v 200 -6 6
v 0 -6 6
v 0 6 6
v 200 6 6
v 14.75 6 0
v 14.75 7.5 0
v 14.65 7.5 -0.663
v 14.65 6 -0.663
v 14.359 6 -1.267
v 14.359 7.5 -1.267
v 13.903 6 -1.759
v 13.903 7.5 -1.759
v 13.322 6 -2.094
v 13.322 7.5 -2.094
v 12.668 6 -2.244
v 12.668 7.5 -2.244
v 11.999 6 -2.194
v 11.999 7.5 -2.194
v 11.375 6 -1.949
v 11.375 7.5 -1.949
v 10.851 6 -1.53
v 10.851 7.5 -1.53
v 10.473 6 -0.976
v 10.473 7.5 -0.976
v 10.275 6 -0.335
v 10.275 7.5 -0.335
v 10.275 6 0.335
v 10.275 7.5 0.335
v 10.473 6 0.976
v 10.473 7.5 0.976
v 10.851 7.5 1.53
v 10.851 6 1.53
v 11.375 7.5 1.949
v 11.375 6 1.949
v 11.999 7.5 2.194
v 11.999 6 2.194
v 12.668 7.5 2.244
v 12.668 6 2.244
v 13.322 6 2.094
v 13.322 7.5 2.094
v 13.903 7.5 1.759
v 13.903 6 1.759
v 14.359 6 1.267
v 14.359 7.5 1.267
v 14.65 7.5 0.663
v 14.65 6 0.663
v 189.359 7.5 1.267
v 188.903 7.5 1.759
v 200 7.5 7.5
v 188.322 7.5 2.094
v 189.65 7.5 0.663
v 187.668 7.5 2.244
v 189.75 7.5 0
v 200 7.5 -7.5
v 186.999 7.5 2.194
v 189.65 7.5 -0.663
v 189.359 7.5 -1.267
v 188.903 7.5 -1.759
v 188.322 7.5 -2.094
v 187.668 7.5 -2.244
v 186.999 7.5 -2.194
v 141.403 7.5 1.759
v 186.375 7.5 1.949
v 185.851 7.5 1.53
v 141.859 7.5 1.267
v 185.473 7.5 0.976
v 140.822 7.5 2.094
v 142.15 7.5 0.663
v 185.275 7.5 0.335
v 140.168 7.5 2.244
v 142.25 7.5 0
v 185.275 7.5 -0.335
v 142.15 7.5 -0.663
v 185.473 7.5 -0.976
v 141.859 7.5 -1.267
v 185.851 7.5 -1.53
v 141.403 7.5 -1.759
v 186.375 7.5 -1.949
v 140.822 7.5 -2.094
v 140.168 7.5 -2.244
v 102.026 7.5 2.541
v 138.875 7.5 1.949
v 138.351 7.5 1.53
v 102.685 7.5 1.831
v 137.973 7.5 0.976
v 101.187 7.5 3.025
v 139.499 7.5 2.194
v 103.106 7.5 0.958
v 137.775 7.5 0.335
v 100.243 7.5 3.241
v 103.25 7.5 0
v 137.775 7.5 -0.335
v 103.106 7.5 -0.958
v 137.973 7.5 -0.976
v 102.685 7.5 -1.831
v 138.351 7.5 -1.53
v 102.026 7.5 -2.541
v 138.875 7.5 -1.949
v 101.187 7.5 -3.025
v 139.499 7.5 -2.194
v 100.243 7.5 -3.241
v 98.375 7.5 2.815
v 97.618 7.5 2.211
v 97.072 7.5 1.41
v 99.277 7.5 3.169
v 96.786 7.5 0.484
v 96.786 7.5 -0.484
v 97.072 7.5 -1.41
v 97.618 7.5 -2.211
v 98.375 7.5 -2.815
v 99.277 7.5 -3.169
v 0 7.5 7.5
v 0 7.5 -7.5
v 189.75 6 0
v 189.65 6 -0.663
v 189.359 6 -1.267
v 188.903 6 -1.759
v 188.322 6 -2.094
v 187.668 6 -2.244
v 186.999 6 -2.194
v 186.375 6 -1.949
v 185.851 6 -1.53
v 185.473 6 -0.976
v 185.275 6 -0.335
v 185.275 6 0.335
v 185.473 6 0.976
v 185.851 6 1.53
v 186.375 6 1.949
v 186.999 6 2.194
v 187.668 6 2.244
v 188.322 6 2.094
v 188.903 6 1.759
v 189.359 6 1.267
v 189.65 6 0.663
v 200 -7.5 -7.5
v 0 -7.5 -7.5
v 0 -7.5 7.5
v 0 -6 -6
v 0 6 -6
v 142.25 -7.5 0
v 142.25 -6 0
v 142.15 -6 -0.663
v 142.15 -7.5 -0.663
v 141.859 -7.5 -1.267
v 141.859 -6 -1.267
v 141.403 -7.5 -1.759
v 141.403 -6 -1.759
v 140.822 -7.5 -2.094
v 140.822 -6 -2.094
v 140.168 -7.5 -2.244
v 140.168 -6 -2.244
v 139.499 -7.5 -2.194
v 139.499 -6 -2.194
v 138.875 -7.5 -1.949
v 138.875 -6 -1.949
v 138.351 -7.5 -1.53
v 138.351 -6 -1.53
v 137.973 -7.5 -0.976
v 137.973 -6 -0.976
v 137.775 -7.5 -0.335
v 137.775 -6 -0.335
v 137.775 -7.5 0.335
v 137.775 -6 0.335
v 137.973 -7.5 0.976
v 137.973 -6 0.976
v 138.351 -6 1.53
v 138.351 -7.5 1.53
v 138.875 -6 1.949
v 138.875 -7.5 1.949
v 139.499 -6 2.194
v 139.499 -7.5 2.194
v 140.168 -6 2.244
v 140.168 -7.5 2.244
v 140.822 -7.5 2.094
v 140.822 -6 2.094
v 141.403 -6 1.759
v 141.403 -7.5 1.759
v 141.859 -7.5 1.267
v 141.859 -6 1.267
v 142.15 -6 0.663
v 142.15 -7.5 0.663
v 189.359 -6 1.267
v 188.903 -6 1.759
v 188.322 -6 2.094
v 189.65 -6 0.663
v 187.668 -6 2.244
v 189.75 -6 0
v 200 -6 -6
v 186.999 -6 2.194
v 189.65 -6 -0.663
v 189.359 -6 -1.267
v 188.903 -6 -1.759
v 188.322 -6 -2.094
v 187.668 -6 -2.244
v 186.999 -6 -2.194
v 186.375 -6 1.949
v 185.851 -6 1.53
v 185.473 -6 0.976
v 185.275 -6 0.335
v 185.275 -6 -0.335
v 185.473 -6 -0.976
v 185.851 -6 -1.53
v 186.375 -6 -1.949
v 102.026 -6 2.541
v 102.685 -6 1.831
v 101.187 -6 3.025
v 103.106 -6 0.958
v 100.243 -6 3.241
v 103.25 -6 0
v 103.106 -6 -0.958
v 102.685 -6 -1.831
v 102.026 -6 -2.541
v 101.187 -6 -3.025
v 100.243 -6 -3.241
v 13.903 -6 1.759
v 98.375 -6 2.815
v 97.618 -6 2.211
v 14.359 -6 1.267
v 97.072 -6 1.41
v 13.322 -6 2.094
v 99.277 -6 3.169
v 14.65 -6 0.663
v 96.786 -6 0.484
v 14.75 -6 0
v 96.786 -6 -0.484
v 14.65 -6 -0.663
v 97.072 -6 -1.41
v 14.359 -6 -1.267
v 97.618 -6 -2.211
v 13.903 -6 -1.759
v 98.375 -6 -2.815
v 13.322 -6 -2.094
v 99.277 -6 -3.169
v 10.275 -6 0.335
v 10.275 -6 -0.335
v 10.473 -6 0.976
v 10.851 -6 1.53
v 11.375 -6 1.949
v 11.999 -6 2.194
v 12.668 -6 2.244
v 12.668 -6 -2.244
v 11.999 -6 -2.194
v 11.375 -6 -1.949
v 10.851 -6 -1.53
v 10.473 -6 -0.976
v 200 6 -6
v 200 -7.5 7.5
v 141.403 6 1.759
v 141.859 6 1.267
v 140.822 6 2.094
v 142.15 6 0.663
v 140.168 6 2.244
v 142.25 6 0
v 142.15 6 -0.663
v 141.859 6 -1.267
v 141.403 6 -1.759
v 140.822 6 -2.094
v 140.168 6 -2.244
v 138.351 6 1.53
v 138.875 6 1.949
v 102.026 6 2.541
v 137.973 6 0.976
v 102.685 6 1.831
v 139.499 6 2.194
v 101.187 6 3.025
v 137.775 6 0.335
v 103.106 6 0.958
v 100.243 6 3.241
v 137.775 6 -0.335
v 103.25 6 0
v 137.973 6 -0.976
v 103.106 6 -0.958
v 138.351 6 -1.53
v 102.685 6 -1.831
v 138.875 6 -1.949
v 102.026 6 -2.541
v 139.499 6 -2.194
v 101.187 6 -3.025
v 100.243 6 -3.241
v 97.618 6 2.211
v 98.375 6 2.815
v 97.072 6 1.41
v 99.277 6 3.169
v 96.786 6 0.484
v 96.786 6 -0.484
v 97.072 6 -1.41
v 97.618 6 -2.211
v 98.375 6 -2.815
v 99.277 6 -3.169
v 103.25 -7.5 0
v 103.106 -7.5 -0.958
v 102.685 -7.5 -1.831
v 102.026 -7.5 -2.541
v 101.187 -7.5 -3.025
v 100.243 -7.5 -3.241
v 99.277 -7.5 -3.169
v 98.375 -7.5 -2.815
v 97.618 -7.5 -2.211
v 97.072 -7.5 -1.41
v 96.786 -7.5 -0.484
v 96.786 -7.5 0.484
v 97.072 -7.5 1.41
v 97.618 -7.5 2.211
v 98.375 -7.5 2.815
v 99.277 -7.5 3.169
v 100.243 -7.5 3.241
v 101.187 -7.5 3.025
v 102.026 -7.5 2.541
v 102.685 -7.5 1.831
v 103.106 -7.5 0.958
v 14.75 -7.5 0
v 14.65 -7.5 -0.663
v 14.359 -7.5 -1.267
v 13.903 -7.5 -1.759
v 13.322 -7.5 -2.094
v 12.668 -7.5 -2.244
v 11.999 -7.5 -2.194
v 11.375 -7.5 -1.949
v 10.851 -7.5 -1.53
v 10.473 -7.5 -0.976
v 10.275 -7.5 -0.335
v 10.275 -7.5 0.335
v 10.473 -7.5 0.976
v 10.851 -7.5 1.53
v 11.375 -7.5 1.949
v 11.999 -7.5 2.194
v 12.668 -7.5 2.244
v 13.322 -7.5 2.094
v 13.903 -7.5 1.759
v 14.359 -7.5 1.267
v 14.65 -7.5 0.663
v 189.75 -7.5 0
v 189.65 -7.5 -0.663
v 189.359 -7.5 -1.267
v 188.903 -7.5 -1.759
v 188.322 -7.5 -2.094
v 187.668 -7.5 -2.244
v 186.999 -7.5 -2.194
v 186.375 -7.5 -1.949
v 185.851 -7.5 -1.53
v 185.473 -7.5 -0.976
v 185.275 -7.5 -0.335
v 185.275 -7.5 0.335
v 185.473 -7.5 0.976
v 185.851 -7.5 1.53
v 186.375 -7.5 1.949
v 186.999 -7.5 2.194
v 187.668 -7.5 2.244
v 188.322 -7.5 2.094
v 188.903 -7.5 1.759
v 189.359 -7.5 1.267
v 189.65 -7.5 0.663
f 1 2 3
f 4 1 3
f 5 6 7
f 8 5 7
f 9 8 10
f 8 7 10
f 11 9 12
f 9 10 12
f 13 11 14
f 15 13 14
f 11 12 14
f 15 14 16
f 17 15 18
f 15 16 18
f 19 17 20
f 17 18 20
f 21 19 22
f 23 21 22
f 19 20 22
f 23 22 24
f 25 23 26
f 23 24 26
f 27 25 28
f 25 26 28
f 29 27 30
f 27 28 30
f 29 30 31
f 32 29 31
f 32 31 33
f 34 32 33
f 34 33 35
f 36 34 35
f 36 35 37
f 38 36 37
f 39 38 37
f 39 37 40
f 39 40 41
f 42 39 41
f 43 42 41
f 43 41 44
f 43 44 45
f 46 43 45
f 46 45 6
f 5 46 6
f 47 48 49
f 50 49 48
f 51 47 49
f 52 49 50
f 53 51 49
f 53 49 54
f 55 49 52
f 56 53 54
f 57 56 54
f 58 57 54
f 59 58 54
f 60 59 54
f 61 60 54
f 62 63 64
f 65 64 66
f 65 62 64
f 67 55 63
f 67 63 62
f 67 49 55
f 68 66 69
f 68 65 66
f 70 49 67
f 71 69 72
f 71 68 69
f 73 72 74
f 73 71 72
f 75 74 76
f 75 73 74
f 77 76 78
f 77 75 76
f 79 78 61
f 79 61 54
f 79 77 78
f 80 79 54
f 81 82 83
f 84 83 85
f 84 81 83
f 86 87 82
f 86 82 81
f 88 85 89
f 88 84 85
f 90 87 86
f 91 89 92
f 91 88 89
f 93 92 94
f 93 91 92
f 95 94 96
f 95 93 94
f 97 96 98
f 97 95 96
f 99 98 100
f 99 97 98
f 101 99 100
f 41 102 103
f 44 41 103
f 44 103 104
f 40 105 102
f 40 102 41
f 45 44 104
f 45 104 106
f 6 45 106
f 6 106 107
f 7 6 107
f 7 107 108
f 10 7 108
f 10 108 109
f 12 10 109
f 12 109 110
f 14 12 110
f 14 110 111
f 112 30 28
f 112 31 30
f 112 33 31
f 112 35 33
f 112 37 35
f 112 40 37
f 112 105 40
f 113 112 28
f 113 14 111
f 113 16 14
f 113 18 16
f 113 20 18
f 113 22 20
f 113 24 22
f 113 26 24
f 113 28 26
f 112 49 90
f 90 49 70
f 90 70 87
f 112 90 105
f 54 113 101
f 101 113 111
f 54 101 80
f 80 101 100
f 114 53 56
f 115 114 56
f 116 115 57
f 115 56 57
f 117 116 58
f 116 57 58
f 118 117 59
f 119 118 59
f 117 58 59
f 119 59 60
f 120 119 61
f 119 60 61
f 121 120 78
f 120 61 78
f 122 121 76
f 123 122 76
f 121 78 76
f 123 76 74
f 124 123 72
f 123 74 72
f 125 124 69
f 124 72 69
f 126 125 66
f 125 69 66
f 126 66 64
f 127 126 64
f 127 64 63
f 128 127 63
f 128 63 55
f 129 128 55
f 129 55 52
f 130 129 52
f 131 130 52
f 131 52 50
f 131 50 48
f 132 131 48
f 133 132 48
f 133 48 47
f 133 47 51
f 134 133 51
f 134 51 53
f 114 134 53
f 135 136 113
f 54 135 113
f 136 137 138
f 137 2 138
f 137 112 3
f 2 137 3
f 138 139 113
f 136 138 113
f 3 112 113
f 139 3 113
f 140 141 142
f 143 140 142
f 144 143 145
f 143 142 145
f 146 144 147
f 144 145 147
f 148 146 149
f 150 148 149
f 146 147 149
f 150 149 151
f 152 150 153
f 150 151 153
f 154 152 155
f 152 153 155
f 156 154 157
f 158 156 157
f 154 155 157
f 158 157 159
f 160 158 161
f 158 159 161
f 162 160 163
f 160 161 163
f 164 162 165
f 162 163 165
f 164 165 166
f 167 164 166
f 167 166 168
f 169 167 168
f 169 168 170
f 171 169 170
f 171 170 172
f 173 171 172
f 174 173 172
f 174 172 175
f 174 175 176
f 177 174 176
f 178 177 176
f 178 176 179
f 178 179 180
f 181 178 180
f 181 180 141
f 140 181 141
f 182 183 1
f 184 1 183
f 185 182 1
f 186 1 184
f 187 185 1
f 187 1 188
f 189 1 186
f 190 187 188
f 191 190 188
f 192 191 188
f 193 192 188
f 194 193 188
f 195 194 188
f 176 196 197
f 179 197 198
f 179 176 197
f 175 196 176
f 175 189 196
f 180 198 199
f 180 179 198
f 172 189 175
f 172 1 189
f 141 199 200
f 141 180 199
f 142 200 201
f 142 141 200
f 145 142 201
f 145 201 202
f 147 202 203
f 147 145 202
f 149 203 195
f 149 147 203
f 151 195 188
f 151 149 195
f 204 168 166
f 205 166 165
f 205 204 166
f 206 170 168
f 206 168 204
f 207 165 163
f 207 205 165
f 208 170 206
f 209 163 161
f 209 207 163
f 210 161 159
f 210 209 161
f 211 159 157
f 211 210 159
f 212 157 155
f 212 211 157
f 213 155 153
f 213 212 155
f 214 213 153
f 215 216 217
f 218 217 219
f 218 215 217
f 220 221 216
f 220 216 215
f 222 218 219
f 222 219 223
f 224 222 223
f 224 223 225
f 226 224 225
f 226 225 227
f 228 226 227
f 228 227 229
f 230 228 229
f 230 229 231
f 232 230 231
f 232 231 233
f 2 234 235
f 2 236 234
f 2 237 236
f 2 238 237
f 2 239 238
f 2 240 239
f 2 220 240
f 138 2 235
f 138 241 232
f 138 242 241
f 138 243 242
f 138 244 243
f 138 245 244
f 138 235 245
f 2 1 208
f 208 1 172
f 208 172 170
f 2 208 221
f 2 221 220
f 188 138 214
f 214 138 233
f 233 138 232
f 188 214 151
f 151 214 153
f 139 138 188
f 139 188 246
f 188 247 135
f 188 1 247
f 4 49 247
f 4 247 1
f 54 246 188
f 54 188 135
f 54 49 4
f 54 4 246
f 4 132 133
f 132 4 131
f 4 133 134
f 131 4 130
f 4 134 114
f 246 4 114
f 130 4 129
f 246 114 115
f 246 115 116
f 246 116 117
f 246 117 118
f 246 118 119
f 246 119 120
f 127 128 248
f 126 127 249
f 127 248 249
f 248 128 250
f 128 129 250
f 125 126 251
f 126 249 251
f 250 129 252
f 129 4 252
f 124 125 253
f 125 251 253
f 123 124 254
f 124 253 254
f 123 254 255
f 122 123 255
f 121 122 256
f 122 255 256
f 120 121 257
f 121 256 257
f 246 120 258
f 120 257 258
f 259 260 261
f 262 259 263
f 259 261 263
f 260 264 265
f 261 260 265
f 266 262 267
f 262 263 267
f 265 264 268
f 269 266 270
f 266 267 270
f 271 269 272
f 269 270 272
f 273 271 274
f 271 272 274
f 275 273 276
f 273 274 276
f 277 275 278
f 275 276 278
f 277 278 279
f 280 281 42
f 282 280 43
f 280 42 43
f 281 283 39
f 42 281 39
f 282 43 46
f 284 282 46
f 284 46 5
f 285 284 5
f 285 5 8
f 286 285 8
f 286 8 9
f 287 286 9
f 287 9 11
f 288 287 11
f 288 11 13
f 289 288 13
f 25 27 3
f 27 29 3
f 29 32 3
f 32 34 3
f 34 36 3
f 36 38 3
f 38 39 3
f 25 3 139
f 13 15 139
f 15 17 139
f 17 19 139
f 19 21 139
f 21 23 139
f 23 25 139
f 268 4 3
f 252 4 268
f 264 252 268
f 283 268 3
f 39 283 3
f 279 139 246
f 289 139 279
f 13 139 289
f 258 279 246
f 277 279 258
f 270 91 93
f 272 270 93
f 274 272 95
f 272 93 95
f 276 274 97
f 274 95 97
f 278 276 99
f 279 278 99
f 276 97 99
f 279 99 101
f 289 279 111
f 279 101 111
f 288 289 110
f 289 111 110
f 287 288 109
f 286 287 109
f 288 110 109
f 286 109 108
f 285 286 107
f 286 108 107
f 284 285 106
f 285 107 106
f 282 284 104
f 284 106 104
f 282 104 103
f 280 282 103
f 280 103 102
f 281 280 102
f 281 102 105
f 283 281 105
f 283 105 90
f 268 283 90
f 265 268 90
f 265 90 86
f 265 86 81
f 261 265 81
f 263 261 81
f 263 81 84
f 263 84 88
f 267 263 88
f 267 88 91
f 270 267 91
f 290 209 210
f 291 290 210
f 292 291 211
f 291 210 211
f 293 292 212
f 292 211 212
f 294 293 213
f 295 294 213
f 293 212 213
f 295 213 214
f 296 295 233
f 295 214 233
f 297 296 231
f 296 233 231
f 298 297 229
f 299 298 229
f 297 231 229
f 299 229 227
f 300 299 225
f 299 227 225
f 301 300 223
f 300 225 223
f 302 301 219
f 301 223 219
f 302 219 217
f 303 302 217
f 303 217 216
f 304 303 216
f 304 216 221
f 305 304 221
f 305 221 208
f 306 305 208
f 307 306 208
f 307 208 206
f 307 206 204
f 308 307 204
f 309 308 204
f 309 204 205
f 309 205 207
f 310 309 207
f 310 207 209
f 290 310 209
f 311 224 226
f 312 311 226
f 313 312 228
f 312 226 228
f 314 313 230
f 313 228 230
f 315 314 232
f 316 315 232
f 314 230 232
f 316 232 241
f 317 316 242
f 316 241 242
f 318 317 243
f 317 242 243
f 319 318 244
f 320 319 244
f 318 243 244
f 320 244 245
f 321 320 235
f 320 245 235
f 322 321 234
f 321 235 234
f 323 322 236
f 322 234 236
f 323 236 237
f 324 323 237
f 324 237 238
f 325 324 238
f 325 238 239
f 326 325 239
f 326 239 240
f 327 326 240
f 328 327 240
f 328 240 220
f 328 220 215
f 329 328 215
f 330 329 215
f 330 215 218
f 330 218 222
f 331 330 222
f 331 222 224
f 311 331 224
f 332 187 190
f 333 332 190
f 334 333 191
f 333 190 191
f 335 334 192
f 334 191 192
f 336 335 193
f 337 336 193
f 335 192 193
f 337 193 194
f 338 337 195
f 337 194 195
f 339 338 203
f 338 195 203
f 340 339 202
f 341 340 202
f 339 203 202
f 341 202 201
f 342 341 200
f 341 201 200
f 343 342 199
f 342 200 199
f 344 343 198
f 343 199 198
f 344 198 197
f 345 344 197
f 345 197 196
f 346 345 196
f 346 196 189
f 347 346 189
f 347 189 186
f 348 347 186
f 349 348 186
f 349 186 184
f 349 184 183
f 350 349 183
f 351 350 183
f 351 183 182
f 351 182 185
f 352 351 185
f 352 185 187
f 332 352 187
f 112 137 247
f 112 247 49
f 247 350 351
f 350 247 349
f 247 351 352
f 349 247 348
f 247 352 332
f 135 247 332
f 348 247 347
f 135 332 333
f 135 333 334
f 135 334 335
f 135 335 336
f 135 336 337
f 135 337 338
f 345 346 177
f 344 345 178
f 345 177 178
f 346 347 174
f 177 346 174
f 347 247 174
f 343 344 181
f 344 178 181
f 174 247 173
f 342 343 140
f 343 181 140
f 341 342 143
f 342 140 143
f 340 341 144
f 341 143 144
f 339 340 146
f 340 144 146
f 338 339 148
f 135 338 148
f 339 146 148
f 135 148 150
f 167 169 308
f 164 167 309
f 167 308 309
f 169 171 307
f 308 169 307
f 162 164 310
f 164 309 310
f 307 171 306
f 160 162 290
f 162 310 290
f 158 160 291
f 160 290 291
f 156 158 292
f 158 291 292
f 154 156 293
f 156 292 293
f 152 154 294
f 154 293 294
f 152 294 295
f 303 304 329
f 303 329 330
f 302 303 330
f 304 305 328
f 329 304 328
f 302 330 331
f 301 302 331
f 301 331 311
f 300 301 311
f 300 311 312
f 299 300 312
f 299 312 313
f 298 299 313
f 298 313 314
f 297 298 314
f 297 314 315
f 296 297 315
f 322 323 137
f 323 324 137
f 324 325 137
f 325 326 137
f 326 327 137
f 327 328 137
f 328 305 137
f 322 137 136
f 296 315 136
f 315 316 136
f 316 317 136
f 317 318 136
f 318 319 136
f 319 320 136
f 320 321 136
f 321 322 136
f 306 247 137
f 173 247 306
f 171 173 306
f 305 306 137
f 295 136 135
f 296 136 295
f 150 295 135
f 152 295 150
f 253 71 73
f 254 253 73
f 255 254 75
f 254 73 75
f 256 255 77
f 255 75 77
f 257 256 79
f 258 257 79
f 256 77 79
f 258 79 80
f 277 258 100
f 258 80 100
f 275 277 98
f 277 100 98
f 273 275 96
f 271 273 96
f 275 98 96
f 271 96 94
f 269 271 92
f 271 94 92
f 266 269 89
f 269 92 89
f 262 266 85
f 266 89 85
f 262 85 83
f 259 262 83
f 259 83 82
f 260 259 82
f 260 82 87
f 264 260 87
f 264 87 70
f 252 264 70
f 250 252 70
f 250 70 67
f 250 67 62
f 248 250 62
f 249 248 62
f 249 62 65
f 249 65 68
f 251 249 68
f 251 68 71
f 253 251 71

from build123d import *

# Parameters (mm, degrees)
SKETCH1_W           = 15
SKETCH1_H           = 15
SKETCH1_W_2         = 12
SKETCH1_H_2         = 12
BOSS_EXTRUDE1_DEPTH = 200
SKETCH2_R           = 3.25
SKETCH2_R_2         = 2.25
CUT_EXTRUDE1_DEPTH  = 16
SKETCH3_R           = 2.25
CUT_EXTRUDE2_DEPTH  = 16


with BuildPart() as part:
    # Sketch1 → Boss-Extrude1 (new body)
    with BuildSketch(Plane(origin=(0, 0, 0), x_dir=(0, 0, -1), z_dir=(1, 0, 0))):
        Rectangle(SKETCH1_W, SKETCH1_H)
        Rectangle(SKETCH1_W_2, SKETCH1_H_2, mode=Mode.SUBTRACT)
    extrude(amount=BOSS_EXTRUDE1_DEPTH)

    # Sketch2 → Cut-Extrude1 (cut, through all)
    with BuildSketch(Plane(origin=(0, 7.5, 0), x_dir=(1, 0, 0), z_dir=(0, 1, 0))):
        with Locations((100, 0)):
            Circle(SKETCH2_R)
        with Locations((140, 0)):
            Circle(SKETCH2_R_2)
    extrude(amount=-CUT_EXTRUDE1_DEPTH, mode=Mode.SUBTRACT)

    # Sketch3 → Cut-Extrude2 (cut, through all)
    with BuildSketch(Plane(origin=(0, 7.5, 0), x_dir=(1, 0, 0), z_dir=(0, 1, 0))):
        with Locations((12.5, 0)):
            Circle(SKETCH3_R)
        with Locations((187.5, 0)):
            Circle(SKETCH3_R)
    extrude(amount=-CUT_EXTRUDE2_DEPTH, mode=Mode.SUBTRACT)


solid = part.part
